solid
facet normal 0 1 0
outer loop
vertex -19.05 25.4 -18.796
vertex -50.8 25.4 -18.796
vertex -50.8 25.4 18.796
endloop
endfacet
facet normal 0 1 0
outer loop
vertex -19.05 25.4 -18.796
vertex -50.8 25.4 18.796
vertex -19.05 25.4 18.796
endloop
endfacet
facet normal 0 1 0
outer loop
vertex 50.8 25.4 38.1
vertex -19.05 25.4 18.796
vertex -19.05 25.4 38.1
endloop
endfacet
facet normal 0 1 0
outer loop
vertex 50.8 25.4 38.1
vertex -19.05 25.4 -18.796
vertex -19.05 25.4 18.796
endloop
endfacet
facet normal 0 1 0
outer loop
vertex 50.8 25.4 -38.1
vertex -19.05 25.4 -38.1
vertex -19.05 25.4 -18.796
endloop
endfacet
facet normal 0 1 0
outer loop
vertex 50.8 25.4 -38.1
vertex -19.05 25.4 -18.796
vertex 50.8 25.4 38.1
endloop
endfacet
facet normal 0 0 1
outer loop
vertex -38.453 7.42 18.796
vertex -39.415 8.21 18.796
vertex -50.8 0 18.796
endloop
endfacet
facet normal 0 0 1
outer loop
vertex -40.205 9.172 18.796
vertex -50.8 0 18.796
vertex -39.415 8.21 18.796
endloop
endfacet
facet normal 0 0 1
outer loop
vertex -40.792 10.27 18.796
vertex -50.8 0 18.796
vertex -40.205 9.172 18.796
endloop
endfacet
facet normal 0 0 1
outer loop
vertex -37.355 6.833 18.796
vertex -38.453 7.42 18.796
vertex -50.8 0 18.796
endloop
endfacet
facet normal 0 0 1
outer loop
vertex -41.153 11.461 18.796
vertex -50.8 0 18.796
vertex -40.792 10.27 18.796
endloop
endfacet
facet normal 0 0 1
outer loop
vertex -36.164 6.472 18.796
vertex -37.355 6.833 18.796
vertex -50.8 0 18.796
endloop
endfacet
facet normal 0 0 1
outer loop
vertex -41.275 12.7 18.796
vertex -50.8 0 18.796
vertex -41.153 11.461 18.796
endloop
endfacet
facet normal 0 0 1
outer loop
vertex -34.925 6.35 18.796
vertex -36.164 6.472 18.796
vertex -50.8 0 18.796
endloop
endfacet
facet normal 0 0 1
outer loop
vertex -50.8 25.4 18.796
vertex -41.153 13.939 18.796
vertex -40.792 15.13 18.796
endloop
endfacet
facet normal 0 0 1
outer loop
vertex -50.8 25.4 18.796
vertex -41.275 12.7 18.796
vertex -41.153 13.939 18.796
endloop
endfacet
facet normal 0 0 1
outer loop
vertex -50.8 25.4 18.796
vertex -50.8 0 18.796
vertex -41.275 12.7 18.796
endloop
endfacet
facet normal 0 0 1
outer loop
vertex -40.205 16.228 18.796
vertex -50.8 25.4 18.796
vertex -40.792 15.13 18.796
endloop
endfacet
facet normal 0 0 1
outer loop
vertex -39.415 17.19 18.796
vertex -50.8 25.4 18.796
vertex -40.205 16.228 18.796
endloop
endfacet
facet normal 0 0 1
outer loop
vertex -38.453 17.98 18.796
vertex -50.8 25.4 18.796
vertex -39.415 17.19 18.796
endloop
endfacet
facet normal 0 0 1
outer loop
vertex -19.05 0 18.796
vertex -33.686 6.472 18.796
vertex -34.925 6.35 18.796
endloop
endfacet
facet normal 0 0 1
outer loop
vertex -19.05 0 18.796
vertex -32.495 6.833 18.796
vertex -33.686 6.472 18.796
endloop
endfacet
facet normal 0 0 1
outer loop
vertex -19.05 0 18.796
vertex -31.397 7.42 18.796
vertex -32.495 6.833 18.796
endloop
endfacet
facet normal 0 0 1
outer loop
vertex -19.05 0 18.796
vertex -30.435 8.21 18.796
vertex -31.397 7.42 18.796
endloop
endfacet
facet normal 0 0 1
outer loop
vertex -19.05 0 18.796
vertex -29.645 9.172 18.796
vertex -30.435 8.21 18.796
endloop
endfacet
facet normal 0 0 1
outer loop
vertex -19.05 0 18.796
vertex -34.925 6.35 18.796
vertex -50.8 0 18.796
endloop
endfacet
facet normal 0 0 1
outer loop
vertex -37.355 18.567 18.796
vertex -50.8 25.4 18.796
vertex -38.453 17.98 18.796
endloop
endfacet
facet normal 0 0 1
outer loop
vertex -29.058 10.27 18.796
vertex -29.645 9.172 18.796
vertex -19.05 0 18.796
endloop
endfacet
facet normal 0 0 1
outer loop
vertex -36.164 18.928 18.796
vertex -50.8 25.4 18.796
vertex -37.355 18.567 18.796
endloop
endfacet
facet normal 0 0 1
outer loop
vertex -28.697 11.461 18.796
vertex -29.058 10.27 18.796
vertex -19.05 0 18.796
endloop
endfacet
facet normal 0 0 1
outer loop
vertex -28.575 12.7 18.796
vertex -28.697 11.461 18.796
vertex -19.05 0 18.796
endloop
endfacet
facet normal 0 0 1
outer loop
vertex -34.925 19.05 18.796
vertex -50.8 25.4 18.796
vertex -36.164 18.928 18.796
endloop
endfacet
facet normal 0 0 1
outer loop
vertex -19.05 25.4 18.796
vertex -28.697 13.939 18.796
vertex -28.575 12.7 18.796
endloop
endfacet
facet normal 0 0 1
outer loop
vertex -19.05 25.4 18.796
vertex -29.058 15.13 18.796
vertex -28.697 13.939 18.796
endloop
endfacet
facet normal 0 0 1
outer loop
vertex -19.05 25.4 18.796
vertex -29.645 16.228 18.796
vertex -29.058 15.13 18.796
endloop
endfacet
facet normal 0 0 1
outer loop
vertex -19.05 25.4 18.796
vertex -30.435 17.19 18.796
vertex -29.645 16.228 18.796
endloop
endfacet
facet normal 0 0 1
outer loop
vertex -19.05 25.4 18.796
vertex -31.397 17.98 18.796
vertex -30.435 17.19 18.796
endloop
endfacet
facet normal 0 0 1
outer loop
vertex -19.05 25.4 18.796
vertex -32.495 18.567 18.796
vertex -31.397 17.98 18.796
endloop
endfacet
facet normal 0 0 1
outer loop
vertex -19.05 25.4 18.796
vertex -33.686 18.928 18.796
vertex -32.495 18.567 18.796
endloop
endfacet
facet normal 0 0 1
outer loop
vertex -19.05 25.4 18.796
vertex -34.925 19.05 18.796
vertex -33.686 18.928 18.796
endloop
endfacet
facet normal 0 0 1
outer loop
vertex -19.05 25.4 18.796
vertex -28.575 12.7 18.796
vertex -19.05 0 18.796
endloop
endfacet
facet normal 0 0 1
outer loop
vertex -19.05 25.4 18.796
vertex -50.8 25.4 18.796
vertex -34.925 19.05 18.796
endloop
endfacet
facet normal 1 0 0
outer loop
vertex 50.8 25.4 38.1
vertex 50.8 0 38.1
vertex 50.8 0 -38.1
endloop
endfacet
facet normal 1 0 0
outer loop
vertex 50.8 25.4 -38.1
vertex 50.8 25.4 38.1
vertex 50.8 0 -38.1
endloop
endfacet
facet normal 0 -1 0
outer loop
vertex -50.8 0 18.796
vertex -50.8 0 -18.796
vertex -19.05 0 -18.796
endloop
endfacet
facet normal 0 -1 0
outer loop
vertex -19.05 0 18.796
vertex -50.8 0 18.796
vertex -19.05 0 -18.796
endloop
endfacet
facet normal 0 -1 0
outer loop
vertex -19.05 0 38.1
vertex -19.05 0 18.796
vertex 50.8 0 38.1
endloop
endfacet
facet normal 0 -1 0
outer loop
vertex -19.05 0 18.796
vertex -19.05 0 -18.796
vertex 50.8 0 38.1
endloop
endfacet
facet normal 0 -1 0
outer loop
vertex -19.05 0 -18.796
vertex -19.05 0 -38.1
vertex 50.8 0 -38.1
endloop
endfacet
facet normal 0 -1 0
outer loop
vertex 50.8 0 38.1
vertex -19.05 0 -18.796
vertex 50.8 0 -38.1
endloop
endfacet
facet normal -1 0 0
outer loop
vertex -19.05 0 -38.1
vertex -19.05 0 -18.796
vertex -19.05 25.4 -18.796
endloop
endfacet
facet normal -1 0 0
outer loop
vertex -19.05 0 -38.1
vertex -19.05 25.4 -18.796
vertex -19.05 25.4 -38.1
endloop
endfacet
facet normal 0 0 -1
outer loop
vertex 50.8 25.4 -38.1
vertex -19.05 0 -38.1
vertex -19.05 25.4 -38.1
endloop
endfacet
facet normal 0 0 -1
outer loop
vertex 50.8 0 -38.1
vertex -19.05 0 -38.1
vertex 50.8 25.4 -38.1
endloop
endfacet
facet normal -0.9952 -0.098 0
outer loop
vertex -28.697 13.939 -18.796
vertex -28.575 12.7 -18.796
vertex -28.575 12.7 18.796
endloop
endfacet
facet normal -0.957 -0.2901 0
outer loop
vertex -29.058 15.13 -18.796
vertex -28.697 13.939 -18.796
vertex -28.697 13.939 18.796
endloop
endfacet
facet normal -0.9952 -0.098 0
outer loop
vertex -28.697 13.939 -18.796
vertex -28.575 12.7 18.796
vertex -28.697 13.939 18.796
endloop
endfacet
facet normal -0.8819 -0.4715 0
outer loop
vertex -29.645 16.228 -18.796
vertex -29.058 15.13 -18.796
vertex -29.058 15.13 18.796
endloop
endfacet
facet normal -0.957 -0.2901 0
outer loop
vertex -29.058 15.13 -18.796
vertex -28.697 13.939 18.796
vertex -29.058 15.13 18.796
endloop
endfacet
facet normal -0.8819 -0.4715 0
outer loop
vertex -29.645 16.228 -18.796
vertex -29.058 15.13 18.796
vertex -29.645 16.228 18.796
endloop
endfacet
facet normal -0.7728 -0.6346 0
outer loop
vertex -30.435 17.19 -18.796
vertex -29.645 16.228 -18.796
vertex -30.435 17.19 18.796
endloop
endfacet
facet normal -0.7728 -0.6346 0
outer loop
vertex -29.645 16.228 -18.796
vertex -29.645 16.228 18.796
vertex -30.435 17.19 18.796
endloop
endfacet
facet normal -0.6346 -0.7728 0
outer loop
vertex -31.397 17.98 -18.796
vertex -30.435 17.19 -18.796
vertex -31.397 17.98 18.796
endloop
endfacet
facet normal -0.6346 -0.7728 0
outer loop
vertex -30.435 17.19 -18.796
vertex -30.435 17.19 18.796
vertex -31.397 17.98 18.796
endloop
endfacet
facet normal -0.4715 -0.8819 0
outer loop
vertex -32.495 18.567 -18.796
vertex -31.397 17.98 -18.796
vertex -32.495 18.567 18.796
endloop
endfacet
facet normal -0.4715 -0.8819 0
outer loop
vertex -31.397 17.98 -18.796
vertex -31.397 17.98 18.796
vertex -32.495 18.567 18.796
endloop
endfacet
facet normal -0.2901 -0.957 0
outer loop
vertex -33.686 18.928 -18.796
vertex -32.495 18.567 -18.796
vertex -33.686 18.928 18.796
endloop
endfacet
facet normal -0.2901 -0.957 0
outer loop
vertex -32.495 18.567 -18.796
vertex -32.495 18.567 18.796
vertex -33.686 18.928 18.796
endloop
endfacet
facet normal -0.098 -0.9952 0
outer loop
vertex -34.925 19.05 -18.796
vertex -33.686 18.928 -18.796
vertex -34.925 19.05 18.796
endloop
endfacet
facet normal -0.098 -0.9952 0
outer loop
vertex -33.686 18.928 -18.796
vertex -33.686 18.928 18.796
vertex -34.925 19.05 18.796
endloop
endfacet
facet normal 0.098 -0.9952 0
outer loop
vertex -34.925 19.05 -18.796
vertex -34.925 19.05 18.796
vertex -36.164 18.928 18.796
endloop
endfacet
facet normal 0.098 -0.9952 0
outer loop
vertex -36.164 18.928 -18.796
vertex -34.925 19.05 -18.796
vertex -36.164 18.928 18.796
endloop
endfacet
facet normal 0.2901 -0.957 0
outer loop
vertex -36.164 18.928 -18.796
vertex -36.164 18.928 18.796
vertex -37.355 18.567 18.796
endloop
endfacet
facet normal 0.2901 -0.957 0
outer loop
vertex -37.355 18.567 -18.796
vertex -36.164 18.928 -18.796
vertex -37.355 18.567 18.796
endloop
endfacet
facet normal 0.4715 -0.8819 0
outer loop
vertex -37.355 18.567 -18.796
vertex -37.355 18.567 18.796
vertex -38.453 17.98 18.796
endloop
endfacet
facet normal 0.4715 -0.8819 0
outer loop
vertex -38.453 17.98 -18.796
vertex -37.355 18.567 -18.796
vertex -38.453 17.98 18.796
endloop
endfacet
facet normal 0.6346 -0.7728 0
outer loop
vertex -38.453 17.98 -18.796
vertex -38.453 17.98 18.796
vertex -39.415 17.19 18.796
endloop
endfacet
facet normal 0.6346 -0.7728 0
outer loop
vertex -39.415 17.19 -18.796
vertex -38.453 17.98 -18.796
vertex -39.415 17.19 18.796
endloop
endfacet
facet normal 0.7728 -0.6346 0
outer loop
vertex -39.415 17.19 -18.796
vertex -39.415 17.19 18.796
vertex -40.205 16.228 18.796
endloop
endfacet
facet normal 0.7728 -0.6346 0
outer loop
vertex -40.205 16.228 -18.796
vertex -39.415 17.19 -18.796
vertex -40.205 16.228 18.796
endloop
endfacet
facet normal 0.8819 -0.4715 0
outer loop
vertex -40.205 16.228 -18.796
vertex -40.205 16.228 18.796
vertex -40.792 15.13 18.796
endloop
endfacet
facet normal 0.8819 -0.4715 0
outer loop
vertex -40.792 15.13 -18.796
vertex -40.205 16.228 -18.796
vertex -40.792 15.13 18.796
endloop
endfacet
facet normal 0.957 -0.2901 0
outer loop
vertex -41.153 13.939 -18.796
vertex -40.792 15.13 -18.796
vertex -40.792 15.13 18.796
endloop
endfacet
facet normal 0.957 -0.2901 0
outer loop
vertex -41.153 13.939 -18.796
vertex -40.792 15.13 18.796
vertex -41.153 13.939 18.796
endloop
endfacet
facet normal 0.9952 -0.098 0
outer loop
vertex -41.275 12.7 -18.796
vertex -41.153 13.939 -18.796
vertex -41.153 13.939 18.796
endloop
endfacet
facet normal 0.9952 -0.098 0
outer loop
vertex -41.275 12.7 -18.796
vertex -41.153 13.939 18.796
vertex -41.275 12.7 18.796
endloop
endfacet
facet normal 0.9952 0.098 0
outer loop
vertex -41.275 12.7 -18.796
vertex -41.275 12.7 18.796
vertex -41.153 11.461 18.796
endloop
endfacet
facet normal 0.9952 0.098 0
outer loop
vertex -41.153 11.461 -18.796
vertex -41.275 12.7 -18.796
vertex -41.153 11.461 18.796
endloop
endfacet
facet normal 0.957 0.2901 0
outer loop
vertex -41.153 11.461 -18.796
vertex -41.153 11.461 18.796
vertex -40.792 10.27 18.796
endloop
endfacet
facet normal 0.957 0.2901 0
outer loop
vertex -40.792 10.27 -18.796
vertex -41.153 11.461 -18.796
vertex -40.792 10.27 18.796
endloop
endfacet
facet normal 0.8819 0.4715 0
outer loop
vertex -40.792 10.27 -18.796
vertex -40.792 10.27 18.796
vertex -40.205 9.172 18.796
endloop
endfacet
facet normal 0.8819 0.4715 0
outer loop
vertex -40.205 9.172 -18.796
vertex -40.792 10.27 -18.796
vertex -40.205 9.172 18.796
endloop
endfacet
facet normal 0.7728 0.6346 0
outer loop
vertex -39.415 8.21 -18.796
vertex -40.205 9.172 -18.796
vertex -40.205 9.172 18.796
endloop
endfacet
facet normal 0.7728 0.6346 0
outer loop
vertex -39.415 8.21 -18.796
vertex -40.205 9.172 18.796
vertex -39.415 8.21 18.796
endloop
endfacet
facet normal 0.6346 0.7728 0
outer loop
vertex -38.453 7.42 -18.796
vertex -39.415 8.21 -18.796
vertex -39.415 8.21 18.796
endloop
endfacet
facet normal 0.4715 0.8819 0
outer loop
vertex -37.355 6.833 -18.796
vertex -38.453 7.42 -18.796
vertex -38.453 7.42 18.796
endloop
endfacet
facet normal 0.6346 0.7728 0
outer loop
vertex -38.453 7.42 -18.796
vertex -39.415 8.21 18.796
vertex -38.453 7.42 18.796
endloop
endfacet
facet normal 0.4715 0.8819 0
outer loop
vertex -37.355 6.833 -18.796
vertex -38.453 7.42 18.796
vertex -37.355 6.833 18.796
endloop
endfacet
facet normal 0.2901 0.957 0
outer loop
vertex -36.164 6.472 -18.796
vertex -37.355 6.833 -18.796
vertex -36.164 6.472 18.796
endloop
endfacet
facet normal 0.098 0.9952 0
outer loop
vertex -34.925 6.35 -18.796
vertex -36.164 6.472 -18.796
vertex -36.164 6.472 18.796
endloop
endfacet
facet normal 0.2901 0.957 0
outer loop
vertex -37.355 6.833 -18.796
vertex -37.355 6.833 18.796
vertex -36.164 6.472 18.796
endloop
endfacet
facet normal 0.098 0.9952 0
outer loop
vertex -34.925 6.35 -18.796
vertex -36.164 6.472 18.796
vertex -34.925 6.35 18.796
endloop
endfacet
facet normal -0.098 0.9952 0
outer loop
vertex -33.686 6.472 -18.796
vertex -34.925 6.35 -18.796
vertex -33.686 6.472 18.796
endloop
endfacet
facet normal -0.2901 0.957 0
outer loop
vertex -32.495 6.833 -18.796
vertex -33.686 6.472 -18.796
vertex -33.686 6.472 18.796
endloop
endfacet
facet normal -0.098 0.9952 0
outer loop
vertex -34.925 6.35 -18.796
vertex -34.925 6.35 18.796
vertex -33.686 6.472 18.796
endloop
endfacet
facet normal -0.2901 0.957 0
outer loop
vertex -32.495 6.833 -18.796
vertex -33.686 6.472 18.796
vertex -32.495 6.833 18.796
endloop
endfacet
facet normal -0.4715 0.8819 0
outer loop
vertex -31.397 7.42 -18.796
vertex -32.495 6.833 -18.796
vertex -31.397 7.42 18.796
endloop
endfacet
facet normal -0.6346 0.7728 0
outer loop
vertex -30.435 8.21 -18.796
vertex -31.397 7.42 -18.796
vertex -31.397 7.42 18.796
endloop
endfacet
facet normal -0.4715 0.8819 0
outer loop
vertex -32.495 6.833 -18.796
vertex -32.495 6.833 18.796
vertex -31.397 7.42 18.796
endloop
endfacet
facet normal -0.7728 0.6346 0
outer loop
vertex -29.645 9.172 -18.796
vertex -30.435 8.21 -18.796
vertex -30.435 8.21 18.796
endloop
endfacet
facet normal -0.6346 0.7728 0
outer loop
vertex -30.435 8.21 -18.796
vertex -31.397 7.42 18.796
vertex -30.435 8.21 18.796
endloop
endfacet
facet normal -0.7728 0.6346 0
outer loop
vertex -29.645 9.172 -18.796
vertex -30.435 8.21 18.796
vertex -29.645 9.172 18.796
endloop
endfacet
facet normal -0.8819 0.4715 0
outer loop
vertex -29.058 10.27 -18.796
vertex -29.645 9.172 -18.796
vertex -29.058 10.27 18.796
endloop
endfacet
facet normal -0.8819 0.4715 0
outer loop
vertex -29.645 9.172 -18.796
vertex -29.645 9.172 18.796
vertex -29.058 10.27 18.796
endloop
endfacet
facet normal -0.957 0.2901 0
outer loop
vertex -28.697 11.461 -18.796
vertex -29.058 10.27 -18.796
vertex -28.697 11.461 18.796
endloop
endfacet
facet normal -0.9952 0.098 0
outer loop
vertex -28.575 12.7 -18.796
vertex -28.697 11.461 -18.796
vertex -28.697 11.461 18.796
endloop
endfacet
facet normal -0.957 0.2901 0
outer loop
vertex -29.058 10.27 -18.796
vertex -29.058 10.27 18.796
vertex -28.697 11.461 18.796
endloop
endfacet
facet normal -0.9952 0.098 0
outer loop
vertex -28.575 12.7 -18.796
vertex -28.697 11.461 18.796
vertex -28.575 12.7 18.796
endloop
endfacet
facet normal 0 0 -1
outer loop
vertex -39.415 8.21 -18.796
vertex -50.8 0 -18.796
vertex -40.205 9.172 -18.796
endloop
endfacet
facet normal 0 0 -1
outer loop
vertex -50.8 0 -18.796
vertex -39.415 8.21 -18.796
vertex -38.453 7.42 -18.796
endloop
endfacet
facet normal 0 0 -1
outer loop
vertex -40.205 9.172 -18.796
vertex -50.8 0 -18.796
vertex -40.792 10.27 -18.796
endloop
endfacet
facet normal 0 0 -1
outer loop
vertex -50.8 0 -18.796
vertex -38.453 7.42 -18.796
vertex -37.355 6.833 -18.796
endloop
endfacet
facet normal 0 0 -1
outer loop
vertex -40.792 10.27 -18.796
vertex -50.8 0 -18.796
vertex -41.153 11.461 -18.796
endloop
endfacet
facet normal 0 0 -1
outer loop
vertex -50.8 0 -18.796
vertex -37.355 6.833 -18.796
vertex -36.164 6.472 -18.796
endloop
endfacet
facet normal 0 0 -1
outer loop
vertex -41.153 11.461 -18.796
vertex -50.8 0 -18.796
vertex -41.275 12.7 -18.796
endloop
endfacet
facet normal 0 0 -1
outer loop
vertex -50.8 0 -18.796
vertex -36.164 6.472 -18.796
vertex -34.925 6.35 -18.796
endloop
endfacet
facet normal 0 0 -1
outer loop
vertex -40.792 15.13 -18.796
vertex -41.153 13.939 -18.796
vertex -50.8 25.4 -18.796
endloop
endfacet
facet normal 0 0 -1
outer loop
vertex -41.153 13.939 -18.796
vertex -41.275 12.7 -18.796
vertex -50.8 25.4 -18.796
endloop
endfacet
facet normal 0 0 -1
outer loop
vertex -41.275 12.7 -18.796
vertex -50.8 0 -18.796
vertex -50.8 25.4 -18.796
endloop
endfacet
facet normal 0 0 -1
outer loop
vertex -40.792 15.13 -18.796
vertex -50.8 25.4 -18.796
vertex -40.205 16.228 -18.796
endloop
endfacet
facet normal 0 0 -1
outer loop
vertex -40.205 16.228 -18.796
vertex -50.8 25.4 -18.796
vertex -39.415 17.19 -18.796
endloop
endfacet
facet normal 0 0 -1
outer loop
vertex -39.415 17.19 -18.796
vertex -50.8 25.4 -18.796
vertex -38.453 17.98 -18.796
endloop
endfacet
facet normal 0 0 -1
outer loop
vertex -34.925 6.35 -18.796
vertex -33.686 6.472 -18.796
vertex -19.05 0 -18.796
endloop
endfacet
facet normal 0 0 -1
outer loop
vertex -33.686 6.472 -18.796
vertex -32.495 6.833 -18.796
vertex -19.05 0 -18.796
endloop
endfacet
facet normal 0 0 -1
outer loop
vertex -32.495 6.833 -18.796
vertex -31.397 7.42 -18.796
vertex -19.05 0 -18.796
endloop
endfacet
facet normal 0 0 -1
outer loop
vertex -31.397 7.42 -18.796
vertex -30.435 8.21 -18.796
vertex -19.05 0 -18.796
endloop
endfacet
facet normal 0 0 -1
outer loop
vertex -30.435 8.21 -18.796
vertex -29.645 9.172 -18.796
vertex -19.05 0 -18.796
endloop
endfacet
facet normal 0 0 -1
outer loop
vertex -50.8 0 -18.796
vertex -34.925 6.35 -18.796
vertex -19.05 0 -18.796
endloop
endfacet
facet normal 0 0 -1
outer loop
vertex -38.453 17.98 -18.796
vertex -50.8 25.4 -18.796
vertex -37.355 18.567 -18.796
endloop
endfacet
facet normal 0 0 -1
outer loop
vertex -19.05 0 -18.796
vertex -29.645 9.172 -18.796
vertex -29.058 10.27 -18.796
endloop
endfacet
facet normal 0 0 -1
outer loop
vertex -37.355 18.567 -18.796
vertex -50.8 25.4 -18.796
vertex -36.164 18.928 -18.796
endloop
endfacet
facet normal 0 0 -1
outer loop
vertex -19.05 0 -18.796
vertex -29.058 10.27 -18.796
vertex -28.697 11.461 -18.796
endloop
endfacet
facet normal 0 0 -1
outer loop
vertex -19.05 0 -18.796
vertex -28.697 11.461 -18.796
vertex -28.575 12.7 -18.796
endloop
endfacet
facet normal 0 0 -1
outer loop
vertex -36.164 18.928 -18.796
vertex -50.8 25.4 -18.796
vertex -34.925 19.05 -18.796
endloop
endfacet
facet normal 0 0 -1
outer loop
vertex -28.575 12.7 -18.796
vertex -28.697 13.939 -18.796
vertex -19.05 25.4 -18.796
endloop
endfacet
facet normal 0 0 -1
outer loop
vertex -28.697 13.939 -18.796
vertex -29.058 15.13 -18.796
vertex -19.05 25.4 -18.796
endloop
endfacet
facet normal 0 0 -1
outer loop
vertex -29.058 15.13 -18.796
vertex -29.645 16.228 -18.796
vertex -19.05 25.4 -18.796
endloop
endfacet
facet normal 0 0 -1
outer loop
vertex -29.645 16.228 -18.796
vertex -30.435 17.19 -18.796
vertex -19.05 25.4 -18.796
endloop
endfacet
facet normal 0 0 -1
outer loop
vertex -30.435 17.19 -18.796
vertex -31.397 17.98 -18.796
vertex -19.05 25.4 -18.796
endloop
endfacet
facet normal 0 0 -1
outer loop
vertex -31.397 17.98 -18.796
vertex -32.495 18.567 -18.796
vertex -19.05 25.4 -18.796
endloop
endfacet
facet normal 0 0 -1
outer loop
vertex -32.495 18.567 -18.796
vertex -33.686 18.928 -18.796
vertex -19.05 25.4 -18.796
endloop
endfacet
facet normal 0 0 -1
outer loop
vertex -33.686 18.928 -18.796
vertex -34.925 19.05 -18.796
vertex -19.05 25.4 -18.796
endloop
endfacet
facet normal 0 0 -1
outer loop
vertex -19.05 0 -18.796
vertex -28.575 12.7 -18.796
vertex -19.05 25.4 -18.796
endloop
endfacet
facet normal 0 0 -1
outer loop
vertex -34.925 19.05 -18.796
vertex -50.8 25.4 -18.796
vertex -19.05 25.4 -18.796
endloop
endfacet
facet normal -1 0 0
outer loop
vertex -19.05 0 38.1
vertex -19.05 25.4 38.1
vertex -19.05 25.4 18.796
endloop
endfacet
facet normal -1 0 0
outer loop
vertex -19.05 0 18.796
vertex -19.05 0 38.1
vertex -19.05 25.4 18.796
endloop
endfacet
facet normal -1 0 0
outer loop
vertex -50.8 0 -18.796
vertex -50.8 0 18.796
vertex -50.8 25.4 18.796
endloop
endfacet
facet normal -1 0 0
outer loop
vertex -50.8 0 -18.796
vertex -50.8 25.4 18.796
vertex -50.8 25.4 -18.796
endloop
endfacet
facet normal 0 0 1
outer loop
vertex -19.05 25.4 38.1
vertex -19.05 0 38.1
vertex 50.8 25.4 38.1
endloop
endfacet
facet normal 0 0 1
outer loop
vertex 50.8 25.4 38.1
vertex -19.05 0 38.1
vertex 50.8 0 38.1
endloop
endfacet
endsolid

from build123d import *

# Parameters (mm, degrees)
SKETCH1_W           = 101.6
SKETCH1_H           = 76.2
BOSS_EXTRUDE1_DEPTH = 25.4
SKETCH2_W           = 31.75
SKETCH2_H           = 19.304
CUT_EXTRUDE2_DEPTH  = 26.4
SKETCH4_R           = 6.35
CUT_EXTRUDE3_DEPTH  = 57.896


with BuildPart() as part:
    # Sketch1 → Boss-Extrude1 (new body)
    with BuildSketch(Plane(origin=(0, 0, 0), x_dir=(1, 0, 0), z_dir=(0, 1, 0))):
        Rectangle(SKETCH1_W, SKETCH1_H)
    extrude(amount=BOSS_EXTRUDE1_DEPTH)

    # Sketch2 → Cut-Extrude2 (cut, through all)
    with BuildSketch(Plane(origin=(0, 25.4, 0), x_dir=(1, 0, 0), z_dir=(0, 1, 0))):
        with Locations((-34.925, 28.448)):
            Rectangle(SKETCH2_W, SKETCH2_H)
        with Locations((-34.925, -28.448)):
            Rectangle(SKETCH2_W, SKETCH2_H)
    extrude(amount=-CUT_EXTRUDE2_DEPTH, mode=Mode.SUBTRACT)

    # Sketch4 → Cut-Extrude3 (cut, through all)
    with BuildSketch(Plane.XY.offset(18.796)):
        with Locations((-34.925, 12.7)):
            Circle(SKETCH4_R)
    extrude(amount=-CUT_EXTRUDE3_DEPTH, mode=Mode.SUBTRACT)


solid = part.part
